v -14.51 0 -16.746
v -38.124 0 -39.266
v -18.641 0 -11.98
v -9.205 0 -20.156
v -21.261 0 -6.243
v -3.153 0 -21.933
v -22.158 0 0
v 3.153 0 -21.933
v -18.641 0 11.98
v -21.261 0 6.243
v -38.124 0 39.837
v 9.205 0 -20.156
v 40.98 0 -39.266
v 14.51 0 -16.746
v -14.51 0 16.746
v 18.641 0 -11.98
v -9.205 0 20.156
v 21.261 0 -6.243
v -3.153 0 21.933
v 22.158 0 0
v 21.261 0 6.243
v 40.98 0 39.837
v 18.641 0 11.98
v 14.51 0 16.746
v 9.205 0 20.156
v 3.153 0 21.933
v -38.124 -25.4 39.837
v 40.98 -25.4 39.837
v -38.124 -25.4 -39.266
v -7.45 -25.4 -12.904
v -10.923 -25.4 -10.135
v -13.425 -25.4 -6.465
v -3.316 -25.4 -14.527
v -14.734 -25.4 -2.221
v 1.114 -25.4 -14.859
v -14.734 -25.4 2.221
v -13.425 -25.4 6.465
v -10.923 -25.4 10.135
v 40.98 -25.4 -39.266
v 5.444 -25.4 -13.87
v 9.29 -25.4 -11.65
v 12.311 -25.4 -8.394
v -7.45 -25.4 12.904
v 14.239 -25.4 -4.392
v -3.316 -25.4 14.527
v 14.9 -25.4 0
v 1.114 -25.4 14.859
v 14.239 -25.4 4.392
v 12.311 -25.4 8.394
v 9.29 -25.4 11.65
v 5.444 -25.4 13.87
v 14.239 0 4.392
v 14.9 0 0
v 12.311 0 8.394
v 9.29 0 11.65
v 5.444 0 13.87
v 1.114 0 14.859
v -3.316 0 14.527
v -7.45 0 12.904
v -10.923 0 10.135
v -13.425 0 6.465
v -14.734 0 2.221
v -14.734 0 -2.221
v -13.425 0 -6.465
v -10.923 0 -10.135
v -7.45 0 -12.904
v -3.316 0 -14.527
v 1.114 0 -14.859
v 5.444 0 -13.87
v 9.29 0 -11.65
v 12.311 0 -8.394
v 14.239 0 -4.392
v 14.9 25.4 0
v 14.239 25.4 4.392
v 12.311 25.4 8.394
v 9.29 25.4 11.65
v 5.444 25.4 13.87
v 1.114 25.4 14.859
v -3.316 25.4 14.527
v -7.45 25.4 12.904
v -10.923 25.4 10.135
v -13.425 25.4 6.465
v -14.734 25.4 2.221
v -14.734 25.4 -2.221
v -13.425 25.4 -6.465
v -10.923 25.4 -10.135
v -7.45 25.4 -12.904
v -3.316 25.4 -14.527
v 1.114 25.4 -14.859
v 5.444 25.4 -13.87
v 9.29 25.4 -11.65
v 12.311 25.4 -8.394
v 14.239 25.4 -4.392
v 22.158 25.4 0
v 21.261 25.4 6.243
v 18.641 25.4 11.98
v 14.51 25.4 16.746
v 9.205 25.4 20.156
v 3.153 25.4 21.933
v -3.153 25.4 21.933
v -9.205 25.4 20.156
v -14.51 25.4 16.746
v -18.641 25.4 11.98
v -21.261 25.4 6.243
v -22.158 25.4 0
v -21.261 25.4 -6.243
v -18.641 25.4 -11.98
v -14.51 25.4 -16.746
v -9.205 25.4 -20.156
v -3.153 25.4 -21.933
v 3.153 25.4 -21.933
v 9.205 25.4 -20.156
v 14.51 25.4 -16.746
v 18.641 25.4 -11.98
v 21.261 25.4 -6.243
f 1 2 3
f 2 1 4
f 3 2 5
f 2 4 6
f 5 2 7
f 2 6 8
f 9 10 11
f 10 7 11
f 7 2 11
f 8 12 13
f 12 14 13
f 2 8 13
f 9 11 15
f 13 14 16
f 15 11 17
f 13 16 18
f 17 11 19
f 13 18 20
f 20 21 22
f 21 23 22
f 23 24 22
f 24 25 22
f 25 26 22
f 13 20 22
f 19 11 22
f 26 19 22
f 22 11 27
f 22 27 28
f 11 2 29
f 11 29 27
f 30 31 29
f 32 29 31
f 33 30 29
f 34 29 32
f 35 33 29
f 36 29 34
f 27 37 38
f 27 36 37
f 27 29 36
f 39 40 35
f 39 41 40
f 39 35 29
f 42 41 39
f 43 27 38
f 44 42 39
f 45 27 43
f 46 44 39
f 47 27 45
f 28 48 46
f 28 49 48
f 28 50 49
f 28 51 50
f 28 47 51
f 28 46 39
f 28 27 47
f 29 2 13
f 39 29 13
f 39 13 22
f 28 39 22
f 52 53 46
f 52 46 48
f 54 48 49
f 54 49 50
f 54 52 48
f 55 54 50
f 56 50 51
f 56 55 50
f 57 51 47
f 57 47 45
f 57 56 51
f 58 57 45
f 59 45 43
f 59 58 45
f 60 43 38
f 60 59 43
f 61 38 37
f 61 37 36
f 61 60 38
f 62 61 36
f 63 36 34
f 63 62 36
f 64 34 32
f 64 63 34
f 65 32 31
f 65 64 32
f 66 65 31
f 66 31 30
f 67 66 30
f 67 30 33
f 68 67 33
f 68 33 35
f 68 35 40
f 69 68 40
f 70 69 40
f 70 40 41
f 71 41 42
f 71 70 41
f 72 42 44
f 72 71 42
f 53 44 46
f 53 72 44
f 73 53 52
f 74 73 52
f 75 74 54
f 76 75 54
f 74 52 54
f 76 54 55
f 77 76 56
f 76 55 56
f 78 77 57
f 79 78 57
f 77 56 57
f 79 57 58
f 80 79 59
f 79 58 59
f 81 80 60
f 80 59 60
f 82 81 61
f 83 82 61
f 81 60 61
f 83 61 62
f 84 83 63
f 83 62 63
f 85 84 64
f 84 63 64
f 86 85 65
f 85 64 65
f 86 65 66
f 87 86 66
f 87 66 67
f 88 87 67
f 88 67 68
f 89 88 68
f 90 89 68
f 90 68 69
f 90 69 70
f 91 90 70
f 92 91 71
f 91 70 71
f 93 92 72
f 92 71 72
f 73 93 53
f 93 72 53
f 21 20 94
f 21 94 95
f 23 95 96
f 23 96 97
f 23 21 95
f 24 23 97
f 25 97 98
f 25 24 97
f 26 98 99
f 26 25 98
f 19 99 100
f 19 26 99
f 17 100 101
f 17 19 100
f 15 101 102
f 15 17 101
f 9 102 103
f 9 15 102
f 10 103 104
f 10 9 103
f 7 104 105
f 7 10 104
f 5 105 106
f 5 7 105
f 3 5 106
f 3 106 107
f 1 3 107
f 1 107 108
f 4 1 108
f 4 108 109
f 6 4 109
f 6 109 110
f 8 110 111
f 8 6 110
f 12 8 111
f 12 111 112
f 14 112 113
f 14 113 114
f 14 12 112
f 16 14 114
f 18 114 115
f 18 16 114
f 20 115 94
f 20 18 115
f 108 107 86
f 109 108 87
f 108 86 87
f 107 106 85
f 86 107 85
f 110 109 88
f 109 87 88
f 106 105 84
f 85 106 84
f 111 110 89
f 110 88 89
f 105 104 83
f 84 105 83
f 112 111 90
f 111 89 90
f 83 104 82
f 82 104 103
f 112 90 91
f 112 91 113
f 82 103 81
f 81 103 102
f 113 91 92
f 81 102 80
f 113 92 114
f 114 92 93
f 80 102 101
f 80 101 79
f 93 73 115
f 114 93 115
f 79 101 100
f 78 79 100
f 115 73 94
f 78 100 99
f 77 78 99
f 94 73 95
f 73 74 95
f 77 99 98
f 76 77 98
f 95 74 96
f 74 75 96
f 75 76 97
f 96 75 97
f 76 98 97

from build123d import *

# Parameters (mm, degrees)
F0_W     = 79.103634
F0_H     = 79.10363
F0_R     = 22.158127
F0_R_2   = 14.900496
F1_DEPTH = 25.4
F2_DEPTH = 25.4
F3_DEPTH = 25.401


with BuildPart() as f1:
    # F0 (on Front) → F1 (new body)
    with BuildSketch(Plane.XZ):
        with Locations((1.427859, 0.285575)):
            Rectangle(F0_W, F0_H)
        Circle(F0_R, mode=Mode.SUBTRACT)
        Circle(F0_R_2)
        Circle(F0_R)
        Circle(F0_R_2, mode=Mode.SUBTRACT)
    extrude(amount=F1_DEPTH)

    # F0 (on Front) → F2 (join)
    with BuildSketch(Plane.XZ):
        Circle(F0_R)
        Circle(F0_R_2, mode=Mode.SUBTRACT)
    extrude(amount=-F2_DEPTH)

    # F0 (on Front) → F3 (cut, through all)
    with BuildSketch(Plane.XZ):
        Circle(F0_R_2)
    extrude(amount=F3_DEPTH, mode=Mode.SUBTRACT)


solid = f1.part
